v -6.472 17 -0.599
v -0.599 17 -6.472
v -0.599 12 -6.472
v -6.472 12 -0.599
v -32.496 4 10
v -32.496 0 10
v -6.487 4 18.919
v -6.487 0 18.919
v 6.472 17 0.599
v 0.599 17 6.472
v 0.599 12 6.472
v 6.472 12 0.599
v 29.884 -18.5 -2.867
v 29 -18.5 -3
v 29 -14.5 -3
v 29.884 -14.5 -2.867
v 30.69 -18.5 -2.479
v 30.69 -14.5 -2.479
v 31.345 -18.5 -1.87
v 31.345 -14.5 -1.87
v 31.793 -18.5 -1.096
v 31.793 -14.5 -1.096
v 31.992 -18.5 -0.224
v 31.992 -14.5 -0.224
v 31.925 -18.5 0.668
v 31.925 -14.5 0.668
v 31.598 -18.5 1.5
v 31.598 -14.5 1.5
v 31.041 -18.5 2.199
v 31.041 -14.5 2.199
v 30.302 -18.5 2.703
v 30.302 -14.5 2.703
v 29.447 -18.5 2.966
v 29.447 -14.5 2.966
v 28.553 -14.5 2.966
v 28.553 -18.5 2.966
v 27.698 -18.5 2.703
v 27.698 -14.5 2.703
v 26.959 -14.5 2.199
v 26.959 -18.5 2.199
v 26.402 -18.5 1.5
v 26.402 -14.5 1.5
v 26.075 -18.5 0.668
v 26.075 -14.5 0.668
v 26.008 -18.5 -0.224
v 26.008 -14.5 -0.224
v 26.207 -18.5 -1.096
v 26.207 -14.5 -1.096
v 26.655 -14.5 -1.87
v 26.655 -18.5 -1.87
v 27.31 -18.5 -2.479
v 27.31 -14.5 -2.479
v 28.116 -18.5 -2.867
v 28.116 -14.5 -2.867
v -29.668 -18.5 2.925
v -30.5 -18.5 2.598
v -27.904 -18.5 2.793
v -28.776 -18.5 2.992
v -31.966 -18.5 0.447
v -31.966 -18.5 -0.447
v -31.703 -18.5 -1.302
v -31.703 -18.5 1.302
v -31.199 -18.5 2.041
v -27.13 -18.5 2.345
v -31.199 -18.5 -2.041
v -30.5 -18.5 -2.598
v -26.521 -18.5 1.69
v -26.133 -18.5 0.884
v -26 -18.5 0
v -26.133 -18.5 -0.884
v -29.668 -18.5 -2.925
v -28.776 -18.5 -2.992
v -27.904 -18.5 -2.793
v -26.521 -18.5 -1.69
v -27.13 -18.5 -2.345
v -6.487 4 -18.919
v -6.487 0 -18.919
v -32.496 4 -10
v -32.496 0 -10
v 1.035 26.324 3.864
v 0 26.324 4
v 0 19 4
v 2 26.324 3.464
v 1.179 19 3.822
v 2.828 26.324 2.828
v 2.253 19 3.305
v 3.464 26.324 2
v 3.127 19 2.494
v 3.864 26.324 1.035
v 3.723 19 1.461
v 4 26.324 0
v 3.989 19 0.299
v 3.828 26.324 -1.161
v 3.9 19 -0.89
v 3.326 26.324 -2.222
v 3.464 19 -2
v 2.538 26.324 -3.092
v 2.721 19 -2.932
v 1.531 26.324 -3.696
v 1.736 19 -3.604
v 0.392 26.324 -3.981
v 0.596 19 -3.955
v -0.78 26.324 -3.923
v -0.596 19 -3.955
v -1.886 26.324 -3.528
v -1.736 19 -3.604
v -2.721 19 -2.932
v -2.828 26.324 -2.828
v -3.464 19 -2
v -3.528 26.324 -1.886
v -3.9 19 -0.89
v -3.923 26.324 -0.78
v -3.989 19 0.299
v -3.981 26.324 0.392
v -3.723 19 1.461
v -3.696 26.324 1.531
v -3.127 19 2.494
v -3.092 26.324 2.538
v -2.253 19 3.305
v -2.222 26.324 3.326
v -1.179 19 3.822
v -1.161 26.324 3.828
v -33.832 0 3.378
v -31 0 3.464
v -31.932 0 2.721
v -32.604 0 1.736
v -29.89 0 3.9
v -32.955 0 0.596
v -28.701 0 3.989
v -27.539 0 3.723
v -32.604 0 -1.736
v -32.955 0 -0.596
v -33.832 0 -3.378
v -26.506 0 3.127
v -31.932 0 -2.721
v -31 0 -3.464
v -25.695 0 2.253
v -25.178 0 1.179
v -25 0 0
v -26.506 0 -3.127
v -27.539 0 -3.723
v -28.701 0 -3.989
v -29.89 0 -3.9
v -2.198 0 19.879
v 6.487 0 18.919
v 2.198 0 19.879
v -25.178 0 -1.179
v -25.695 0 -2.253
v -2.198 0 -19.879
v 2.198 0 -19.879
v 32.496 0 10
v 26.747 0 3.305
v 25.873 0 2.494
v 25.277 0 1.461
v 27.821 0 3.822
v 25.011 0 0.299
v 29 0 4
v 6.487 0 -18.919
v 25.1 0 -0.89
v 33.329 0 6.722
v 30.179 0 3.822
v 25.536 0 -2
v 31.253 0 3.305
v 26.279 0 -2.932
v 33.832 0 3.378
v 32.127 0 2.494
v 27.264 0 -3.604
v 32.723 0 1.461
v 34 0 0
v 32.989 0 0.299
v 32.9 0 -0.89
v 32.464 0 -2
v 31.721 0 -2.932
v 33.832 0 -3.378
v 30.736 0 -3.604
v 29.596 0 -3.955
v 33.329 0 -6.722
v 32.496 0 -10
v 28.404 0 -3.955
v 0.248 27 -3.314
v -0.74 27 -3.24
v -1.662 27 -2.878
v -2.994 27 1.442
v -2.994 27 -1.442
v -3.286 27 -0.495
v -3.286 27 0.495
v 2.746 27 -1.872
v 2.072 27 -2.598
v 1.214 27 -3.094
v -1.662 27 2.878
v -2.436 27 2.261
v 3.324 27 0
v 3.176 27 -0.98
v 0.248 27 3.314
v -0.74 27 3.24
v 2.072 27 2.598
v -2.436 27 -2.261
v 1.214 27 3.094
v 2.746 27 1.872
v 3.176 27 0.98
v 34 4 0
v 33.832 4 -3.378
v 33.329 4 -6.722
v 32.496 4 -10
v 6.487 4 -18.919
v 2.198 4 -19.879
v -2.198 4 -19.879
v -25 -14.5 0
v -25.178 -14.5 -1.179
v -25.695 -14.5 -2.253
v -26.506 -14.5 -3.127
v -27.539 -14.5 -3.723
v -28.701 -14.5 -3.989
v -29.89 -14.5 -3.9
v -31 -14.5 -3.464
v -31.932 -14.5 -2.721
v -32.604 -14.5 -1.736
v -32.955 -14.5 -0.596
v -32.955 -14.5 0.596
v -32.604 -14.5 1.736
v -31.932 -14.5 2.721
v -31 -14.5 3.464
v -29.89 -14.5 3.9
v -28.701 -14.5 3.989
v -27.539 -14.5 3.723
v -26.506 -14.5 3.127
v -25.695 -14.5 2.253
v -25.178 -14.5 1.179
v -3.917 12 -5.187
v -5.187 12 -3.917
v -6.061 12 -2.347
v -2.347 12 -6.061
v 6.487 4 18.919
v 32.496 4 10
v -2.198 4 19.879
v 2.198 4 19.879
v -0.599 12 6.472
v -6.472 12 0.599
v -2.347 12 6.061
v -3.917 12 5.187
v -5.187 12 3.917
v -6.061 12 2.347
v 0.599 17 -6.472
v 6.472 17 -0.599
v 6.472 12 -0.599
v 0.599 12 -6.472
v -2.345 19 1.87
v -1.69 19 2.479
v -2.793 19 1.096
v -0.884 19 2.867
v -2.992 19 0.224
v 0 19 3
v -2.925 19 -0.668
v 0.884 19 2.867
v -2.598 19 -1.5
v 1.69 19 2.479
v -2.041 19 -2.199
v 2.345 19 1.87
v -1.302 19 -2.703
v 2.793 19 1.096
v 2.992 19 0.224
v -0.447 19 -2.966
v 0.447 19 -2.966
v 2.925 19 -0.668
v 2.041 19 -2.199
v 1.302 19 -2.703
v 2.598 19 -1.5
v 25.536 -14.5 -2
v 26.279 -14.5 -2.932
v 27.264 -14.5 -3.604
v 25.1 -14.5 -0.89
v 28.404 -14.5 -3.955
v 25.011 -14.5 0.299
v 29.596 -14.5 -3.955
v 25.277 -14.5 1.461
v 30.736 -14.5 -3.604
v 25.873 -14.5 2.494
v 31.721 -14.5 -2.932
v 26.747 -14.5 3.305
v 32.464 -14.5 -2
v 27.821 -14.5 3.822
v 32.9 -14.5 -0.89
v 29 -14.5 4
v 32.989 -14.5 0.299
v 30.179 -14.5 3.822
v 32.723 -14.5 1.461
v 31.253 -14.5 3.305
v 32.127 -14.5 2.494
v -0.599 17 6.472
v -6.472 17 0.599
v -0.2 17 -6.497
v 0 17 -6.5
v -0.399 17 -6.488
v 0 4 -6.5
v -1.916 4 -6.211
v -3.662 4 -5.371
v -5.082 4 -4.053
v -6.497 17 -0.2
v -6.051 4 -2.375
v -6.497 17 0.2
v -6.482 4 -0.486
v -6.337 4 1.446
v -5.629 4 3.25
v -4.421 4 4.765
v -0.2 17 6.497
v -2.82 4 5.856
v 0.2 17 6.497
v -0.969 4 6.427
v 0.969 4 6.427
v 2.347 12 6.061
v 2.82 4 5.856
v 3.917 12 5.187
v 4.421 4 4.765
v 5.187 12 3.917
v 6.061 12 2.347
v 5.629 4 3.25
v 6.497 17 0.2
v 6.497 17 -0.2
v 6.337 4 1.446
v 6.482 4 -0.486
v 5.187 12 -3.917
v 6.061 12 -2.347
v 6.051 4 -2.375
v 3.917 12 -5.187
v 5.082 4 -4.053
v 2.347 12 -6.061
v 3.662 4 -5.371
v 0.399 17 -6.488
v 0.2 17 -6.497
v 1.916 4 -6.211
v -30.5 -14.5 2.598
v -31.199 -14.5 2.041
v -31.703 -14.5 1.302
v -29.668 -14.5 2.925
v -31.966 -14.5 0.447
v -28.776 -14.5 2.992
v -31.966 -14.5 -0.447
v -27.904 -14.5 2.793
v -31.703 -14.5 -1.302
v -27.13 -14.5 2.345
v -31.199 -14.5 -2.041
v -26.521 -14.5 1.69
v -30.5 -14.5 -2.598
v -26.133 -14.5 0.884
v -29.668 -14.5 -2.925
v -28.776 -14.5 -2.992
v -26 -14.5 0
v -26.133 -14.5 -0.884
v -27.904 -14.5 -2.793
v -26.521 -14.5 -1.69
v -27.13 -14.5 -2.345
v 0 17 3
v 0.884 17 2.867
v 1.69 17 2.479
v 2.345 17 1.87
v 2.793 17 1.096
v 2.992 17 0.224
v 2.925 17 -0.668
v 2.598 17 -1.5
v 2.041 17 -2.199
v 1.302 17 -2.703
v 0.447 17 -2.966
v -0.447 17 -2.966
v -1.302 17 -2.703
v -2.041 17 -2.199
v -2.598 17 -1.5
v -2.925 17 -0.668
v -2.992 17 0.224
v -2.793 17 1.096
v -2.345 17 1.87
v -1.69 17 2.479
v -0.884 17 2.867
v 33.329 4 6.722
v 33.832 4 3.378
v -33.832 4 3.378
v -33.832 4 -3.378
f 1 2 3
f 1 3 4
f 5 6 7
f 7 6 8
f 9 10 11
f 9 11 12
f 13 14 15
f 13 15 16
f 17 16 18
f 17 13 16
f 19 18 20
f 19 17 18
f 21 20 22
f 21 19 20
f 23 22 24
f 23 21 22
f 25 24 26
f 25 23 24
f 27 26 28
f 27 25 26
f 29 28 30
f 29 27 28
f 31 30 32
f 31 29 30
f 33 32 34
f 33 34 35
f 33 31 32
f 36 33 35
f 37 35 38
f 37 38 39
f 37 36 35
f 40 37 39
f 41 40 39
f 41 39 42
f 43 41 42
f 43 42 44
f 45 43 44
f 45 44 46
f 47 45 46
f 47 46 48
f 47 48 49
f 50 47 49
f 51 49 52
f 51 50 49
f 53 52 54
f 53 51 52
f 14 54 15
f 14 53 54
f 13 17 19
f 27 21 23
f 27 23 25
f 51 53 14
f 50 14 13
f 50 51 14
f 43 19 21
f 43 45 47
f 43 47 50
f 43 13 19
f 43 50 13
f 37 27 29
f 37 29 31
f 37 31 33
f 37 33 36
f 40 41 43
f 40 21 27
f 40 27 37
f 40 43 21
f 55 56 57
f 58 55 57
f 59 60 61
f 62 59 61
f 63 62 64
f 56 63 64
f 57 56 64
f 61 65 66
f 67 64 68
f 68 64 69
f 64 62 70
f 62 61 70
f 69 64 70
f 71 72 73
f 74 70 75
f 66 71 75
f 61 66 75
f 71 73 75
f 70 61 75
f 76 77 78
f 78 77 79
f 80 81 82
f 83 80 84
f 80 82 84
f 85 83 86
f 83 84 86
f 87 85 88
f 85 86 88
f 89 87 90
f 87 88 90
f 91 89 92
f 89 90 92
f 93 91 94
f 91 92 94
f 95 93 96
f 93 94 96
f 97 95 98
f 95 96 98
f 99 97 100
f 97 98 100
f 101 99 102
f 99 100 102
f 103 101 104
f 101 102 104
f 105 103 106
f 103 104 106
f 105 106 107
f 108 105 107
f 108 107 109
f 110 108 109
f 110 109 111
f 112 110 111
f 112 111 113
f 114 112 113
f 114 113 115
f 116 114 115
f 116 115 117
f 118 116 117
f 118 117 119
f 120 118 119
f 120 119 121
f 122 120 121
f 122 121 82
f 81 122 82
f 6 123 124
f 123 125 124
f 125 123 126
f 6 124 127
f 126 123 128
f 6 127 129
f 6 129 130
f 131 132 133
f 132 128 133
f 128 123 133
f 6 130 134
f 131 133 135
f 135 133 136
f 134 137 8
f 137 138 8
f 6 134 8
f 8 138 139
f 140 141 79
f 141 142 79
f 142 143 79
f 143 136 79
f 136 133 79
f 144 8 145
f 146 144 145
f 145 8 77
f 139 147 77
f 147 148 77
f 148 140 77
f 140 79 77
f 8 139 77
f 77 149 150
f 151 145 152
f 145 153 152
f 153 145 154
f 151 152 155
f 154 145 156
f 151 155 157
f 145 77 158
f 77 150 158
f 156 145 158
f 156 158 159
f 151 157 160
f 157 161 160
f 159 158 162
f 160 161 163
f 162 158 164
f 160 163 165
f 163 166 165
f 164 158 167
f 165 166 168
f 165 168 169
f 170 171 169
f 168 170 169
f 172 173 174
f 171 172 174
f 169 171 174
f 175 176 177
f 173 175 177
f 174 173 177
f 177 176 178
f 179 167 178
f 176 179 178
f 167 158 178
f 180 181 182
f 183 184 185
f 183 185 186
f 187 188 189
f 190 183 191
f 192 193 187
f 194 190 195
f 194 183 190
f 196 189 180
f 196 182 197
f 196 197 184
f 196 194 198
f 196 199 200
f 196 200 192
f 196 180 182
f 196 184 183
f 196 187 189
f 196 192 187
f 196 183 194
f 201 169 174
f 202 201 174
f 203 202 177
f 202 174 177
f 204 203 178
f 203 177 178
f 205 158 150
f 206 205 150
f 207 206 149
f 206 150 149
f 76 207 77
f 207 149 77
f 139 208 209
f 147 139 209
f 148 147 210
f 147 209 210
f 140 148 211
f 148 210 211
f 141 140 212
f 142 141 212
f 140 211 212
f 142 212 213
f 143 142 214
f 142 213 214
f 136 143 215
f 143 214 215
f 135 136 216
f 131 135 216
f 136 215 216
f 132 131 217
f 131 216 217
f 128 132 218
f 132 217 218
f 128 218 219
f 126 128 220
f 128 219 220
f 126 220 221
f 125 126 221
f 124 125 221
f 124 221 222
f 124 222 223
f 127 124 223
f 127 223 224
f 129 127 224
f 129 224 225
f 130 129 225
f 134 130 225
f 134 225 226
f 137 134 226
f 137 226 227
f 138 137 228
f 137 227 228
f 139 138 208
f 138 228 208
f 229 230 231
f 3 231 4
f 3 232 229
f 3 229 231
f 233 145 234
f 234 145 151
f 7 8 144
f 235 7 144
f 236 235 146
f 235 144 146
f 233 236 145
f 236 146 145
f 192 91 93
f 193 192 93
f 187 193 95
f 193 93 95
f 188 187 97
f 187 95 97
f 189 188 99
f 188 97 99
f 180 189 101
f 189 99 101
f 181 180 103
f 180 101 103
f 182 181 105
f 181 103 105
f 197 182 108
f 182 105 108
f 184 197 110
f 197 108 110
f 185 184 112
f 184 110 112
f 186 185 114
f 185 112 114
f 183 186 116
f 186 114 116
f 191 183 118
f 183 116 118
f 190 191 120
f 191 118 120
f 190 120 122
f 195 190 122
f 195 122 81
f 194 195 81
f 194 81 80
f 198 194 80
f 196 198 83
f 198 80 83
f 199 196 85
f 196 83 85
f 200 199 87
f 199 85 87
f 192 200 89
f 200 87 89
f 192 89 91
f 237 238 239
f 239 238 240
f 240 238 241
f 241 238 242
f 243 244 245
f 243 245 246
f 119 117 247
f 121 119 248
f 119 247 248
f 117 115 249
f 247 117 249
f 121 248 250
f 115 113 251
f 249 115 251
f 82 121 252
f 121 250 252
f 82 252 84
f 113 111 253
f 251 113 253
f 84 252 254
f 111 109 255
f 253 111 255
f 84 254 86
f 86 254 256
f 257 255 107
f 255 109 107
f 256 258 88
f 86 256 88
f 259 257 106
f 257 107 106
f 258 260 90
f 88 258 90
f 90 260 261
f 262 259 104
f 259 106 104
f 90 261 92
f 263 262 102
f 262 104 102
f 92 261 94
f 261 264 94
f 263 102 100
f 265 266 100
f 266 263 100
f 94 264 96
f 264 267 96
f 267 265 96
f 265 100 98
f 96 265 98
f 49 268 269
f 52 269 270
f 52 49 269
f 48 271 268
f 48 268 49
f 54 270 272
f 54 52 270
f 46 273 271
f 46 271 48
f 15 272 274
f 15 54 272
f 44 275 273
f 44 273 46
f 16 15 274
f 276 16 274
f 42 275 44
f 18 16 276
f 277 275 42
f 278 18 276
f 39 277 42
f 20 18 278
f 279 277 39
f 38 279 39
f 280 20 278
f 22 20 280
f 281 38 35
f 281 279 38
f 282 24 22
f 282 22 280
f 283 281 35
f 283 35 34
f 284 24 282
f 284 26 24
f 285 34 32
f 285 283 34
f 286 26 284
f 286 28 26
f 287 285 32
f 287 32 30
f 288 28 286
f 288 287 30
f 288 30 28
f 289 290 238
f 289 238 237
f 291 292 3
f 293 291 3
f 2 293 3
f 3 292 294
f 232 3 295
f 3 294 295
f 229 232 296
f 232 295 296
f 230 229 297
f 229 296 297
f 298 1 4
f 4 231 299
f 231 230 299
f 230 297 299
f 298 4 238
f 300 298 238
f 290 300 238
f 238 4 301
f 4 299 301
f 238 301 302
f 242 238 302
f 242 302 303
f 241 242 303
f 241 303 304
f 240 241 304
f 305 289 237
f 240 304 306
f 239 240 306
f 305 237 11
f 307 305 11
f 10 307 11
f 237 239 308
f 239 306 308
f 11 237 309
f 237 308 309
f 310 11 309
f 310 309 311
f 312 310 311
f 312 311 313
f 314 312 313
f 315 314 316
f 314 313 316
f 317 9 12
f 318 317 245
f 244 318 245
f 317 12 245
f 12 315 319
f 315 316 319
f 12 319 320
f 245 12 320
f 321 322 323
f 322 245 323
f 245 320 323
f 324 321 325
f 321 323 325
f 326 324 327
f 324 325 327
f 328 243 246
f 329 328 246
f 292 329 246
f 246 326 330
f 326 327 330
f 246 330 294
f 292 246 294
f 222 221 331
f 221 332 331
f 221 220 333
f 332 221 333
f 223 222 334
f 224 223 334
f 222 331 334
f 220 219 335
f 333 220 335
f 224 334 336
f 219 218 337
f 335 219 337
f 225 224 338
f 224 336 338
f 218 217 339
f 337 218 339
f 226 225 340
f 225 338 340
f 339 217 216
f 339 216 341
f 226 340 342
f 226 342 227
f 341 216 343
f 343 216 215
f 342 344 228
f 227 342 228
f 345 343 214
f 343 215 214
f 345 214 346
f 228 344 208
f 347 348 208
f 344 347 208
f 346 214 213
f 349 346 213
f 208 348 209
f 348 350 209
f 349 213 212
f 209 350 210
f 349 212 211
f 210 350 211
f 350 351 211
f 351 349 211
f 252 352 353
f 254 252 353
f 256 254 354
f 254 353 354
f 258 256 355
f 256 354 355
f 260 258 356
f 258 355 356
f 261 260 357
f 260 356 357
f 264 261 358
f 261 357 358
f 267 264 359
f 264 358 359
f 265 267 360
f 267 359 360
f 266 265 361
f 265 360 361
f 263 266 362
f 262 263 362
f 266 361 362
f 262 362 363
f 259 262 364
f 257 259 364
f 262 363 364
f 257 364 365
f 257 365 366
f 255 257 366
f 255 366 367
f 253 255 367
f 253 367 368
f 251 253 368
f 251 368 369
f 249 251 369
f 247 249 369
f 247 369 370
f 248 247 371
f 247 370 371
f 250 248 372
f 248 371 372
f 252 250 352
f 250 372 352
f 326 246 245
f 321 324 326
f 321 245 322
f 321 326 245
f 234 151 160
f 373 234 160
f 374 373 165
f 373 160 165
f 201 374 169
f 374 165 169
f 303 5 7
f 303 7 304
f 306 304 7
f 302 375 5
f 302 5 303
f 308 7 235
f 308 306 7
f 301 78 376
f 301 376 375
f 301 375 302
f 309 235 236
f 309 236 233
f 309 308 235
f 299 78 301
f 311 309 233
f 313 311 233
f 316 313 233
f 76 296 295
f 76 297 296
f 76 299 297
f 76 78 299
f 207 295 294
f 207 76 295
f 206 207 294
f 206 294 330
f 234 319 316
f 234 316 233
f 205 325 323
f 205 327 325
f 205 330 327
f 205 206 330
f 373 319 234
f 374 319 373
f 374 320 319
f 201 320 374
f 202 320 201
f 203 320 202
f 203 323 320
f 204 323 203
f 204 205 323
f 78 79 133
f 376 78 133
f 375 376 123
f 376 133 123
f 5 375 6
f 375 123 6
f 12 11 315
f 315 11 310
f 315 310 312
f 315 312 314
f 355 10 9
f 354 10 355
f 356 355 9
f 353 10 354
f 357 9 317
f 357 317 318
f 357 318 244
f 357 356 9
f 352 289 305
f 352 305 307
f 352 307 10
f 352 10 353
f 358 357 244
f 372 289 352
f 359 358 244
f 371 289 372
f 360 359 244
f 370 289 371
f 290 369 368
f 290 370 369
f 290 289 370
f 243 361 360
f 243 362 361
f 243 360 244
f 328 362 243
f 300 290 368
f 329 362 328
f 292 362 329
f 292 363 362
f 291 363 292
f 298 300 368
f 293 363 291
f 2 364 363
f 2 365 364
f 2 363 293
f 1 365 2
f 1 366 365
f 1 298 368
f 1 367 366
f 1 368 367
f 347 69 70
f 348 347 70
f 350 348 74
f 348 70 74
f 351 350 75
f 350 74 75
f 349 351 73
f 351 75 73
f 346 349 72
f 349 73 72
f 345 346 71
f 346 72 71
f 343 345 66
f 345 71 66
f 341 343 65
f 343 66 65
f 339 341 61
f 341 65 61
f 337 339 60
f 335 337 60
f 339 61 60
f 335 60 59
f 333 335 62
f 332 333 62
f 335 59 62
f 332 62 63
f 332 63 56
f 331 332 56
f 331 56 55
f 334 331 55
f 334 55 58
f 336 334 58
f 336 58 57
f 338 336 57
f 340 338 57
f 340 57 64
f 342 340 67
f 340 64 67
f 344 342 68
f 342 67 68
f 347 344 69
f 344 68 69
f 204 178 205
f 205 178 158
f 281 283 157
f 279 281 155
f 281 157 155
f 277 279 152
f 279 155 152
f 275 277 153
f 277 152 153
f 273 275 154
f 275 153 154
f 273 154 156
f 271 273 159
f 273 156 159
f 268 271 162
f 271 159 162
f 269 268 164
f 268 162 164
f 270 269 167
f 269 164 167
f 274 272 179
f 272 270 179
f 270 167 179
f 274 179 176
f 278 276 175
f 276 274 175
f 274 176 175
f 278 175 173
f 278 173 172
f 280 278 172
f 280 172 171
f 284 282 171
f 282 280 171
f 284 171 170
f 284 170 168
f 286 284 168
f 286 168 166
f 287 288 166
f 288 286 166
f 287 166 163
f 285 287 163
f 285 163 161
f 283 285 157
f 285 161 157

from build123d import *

# Parameters (mm, degrees)
EXTRUDE_1_DEPTH      = 4
SKETCH_2_R           = 6.5
EXTRUDE_2_DEPTH      = 13
SKETCH_3_R           = 4
EXTRUDE_3_DEPTH      = 10
SKETCH_4_OUTSIDE_W   = 86.676
SKETCH_4_OUTSIDE_H   = 58.676
SKETCH_4_OUTSIDE_R   = 3
CUT_EXTRUDE_1_DEPTH  = 2
SKETCH_6_OUTSIDE_W   = 86.676
SKETCH_6_OUTSIDE_H   = 58.676
CUT_EXTRUDE_2_DEPTH  = 5
SKETCH_7_R           = 4
EXTRUDE_4_DEPTH      = 18.5
SKETCH_8_OUTSIDE_W   = 88.214
SKETCH_8_OUTSIDE_H   = 60.214
SKETCH_8_OUTSIDE_R   = 3
CUT_EXTRUDE_3_DEPTH  = 4
MIRROR_START         = -14.5
MIRROR_1_OUTLINE_R   = 4
MIRROR_1_DEPTH       = 14.5
MIRROR_START_2       = -18.5
MIRROR_1_2_OUTLINE_R = 3
MIRROR_1_2_DEPTH     = 4


# Read off the part's stored shape, not the designer's step: M8 机械螺纹 螺柱1, 镜向1
with BuildPart() as part:
    # 草图1 → 凸台-拉伸1 (new body)
    with BuildSketch(Plane(origin=(0, 0, 0), x_dir=(1, 0, 0), z_dir=(0, 1, 0))):
        with BuildLine():
            Line((-6.487344821, 18.918624611), (-32.496153619, 10))
            ThreePointArc((-32.496153619, 10), (-34, 0), (-32.496153619, -10))
            Line((-32.496153619, -10), (-6.487344821, -18.918624611))
            ThreePointArc((-6.487344821, -18.918624611), (0, -20), (6.487344821, -18.918624611))
            Line((6.487344821, -18.918624611), (32.496153619, -10))
            ThreePointArc((32.496153619, -10), (33.621936463, -5.056222749), (34, 0))
            ThreePointArc((34, 0), (33.621936463, 5.056222749), (32.496153619, 10))
            Line((32.496153619, 10), (6.487344821, 18.918624611))
            ThreePointArc((6.487344821, 18.918624611), (0, 20), (-6.487344821, 18.918624611))
        make_face()
    extrude(amount=EXTRUDE_1_DEPTH)

    # 草图2 → 凸台-拉伸2 (add)
    with BuildSketch(Plane(origin=(0, 4, 0), x_dir=(1, 0, 0), z_dir=(0, 1, 0))):
        with Locations(Location((0, 0, 0), (0, 0, 90))):
            Circle(SKETCH_2_R)
    extrude(amount=EXTRUDE_2_DEPTH)

    # 草图3 → 凸台-拉伸3 (add)
    with BuildSketch(Plane(origin=(0, 17, 0), x_dir=(1, 0, 0), z_dir=(0, 1, 0))):
        with Locations(Location((0, 0, 0), (0, 0, 270))):
            Circle(SKETCH_3_R)
    extrude(amount=EXTRUDE_3_DEPTH)

    # 草图4 outside → 切除-拉伸1 (cut)
    with BuildSketch(Plane(origin=(0, 17, 0), x_dir=(1, 0, 0), z_dir=(0, 1, 0))):
        Rectangle(SKETCH_4_OUTSIDE_W, SKETCH_4_OUTSIDE_H)
        with Locations(Location((0, 0, 0), (0, 0, 270))):
            Circle(SKETCH_4_OUTSIDE_R, mode=Mode.SUBTRACT)
    extrude(amount=CUT_EXTRUDE_1_DEPTH, mode=Mode.SUBTRACT)

    # M8 机械螺纹 螺柱1 outline → M8 机械螺纹 螺柱1 (revolve, cut)
    with BuildSketch(Plane.XY):
        Polygon((4, 27), (3.3235, 27), (4, 26.3235), align=None)
    revolve(axis=Axis((0, 0, 0), (0, 1, 0)), mode=Mode.SUBTRACT)

    # 草图6 outside → 切除-拉伸2 (cut)
    with BuildSketch(Plane(origin=(0, 17, 0), x_dir=(1, 0, 0), z_dir=(0, 1, 0))):
        Rectangle(SKETCH_6_OUTSIDE_W, SKETCH_6_OUTSIDE_H)
        Polygon((0, -7.071067812), (7.071067812, 0), (0, 7.071067812), (-7.071067812, 0), align=None, mode=Mode.SUBTRACT)
    extrude(amount=-CUT_EXTRUDE_2_DEPTH, mode=Mode.SUBTRACT)

    # 草图7 → 凸台-拉伸4 (add)
    with BuildSketch(Plane.XZ):
        with Locations(Location((29, 0, 0), (0, 0, 90))):
            Circle(SKETCH_7_R)
    extrude(amount=EXTRUDE_4_DEPTH)

    # 草图8 outside → 切除-拉伸3 (cut)
    with BuildSketch(Plane.XZ.offset(18.5)):
        Rectangle(SKETCH_8_OUTSIDE_W, SKETCH_8_OUTSIDE_H)
        with Locations(Location((29, 0, 0), (0, 0, 270))):
            Circle(SKETCH_8_OUTSIDE_R, mode=Mode.SUBTRACT)
    extrude(amount=-CUT_EXTRUDE_3_DEPTH, mode=Mode.SUBTRACT)

    # 镜向1 outline → 镜向1 (add)
    with BuildSketch(Plane(origin=(0, 0, 0), x_dir=(1, 0, 0), z_dir=(0, 1, 0)).offset(MIRROR_START)):
        with Locations((-29, 0)):
            Circle(MIRROR_1_OUTLINE_R)
    extrude(amount=MIRROR_1_DEPTH)

    # Mirror 1 2 outline → Mirror 1 2 (add)
    with BuildSketch(Plane(origin=(0, 0, 0), x_dir=(1, 0, 0), z_dir=(0, 1, 0)).offset(MIRROR_START_2)):
        with Locations((-29, 0)):
            Circle(MIRROR_1_2_OUTLINE_R)
    extrude(amount=MIRROR_1_2_DEPTH)


solid = part.part
